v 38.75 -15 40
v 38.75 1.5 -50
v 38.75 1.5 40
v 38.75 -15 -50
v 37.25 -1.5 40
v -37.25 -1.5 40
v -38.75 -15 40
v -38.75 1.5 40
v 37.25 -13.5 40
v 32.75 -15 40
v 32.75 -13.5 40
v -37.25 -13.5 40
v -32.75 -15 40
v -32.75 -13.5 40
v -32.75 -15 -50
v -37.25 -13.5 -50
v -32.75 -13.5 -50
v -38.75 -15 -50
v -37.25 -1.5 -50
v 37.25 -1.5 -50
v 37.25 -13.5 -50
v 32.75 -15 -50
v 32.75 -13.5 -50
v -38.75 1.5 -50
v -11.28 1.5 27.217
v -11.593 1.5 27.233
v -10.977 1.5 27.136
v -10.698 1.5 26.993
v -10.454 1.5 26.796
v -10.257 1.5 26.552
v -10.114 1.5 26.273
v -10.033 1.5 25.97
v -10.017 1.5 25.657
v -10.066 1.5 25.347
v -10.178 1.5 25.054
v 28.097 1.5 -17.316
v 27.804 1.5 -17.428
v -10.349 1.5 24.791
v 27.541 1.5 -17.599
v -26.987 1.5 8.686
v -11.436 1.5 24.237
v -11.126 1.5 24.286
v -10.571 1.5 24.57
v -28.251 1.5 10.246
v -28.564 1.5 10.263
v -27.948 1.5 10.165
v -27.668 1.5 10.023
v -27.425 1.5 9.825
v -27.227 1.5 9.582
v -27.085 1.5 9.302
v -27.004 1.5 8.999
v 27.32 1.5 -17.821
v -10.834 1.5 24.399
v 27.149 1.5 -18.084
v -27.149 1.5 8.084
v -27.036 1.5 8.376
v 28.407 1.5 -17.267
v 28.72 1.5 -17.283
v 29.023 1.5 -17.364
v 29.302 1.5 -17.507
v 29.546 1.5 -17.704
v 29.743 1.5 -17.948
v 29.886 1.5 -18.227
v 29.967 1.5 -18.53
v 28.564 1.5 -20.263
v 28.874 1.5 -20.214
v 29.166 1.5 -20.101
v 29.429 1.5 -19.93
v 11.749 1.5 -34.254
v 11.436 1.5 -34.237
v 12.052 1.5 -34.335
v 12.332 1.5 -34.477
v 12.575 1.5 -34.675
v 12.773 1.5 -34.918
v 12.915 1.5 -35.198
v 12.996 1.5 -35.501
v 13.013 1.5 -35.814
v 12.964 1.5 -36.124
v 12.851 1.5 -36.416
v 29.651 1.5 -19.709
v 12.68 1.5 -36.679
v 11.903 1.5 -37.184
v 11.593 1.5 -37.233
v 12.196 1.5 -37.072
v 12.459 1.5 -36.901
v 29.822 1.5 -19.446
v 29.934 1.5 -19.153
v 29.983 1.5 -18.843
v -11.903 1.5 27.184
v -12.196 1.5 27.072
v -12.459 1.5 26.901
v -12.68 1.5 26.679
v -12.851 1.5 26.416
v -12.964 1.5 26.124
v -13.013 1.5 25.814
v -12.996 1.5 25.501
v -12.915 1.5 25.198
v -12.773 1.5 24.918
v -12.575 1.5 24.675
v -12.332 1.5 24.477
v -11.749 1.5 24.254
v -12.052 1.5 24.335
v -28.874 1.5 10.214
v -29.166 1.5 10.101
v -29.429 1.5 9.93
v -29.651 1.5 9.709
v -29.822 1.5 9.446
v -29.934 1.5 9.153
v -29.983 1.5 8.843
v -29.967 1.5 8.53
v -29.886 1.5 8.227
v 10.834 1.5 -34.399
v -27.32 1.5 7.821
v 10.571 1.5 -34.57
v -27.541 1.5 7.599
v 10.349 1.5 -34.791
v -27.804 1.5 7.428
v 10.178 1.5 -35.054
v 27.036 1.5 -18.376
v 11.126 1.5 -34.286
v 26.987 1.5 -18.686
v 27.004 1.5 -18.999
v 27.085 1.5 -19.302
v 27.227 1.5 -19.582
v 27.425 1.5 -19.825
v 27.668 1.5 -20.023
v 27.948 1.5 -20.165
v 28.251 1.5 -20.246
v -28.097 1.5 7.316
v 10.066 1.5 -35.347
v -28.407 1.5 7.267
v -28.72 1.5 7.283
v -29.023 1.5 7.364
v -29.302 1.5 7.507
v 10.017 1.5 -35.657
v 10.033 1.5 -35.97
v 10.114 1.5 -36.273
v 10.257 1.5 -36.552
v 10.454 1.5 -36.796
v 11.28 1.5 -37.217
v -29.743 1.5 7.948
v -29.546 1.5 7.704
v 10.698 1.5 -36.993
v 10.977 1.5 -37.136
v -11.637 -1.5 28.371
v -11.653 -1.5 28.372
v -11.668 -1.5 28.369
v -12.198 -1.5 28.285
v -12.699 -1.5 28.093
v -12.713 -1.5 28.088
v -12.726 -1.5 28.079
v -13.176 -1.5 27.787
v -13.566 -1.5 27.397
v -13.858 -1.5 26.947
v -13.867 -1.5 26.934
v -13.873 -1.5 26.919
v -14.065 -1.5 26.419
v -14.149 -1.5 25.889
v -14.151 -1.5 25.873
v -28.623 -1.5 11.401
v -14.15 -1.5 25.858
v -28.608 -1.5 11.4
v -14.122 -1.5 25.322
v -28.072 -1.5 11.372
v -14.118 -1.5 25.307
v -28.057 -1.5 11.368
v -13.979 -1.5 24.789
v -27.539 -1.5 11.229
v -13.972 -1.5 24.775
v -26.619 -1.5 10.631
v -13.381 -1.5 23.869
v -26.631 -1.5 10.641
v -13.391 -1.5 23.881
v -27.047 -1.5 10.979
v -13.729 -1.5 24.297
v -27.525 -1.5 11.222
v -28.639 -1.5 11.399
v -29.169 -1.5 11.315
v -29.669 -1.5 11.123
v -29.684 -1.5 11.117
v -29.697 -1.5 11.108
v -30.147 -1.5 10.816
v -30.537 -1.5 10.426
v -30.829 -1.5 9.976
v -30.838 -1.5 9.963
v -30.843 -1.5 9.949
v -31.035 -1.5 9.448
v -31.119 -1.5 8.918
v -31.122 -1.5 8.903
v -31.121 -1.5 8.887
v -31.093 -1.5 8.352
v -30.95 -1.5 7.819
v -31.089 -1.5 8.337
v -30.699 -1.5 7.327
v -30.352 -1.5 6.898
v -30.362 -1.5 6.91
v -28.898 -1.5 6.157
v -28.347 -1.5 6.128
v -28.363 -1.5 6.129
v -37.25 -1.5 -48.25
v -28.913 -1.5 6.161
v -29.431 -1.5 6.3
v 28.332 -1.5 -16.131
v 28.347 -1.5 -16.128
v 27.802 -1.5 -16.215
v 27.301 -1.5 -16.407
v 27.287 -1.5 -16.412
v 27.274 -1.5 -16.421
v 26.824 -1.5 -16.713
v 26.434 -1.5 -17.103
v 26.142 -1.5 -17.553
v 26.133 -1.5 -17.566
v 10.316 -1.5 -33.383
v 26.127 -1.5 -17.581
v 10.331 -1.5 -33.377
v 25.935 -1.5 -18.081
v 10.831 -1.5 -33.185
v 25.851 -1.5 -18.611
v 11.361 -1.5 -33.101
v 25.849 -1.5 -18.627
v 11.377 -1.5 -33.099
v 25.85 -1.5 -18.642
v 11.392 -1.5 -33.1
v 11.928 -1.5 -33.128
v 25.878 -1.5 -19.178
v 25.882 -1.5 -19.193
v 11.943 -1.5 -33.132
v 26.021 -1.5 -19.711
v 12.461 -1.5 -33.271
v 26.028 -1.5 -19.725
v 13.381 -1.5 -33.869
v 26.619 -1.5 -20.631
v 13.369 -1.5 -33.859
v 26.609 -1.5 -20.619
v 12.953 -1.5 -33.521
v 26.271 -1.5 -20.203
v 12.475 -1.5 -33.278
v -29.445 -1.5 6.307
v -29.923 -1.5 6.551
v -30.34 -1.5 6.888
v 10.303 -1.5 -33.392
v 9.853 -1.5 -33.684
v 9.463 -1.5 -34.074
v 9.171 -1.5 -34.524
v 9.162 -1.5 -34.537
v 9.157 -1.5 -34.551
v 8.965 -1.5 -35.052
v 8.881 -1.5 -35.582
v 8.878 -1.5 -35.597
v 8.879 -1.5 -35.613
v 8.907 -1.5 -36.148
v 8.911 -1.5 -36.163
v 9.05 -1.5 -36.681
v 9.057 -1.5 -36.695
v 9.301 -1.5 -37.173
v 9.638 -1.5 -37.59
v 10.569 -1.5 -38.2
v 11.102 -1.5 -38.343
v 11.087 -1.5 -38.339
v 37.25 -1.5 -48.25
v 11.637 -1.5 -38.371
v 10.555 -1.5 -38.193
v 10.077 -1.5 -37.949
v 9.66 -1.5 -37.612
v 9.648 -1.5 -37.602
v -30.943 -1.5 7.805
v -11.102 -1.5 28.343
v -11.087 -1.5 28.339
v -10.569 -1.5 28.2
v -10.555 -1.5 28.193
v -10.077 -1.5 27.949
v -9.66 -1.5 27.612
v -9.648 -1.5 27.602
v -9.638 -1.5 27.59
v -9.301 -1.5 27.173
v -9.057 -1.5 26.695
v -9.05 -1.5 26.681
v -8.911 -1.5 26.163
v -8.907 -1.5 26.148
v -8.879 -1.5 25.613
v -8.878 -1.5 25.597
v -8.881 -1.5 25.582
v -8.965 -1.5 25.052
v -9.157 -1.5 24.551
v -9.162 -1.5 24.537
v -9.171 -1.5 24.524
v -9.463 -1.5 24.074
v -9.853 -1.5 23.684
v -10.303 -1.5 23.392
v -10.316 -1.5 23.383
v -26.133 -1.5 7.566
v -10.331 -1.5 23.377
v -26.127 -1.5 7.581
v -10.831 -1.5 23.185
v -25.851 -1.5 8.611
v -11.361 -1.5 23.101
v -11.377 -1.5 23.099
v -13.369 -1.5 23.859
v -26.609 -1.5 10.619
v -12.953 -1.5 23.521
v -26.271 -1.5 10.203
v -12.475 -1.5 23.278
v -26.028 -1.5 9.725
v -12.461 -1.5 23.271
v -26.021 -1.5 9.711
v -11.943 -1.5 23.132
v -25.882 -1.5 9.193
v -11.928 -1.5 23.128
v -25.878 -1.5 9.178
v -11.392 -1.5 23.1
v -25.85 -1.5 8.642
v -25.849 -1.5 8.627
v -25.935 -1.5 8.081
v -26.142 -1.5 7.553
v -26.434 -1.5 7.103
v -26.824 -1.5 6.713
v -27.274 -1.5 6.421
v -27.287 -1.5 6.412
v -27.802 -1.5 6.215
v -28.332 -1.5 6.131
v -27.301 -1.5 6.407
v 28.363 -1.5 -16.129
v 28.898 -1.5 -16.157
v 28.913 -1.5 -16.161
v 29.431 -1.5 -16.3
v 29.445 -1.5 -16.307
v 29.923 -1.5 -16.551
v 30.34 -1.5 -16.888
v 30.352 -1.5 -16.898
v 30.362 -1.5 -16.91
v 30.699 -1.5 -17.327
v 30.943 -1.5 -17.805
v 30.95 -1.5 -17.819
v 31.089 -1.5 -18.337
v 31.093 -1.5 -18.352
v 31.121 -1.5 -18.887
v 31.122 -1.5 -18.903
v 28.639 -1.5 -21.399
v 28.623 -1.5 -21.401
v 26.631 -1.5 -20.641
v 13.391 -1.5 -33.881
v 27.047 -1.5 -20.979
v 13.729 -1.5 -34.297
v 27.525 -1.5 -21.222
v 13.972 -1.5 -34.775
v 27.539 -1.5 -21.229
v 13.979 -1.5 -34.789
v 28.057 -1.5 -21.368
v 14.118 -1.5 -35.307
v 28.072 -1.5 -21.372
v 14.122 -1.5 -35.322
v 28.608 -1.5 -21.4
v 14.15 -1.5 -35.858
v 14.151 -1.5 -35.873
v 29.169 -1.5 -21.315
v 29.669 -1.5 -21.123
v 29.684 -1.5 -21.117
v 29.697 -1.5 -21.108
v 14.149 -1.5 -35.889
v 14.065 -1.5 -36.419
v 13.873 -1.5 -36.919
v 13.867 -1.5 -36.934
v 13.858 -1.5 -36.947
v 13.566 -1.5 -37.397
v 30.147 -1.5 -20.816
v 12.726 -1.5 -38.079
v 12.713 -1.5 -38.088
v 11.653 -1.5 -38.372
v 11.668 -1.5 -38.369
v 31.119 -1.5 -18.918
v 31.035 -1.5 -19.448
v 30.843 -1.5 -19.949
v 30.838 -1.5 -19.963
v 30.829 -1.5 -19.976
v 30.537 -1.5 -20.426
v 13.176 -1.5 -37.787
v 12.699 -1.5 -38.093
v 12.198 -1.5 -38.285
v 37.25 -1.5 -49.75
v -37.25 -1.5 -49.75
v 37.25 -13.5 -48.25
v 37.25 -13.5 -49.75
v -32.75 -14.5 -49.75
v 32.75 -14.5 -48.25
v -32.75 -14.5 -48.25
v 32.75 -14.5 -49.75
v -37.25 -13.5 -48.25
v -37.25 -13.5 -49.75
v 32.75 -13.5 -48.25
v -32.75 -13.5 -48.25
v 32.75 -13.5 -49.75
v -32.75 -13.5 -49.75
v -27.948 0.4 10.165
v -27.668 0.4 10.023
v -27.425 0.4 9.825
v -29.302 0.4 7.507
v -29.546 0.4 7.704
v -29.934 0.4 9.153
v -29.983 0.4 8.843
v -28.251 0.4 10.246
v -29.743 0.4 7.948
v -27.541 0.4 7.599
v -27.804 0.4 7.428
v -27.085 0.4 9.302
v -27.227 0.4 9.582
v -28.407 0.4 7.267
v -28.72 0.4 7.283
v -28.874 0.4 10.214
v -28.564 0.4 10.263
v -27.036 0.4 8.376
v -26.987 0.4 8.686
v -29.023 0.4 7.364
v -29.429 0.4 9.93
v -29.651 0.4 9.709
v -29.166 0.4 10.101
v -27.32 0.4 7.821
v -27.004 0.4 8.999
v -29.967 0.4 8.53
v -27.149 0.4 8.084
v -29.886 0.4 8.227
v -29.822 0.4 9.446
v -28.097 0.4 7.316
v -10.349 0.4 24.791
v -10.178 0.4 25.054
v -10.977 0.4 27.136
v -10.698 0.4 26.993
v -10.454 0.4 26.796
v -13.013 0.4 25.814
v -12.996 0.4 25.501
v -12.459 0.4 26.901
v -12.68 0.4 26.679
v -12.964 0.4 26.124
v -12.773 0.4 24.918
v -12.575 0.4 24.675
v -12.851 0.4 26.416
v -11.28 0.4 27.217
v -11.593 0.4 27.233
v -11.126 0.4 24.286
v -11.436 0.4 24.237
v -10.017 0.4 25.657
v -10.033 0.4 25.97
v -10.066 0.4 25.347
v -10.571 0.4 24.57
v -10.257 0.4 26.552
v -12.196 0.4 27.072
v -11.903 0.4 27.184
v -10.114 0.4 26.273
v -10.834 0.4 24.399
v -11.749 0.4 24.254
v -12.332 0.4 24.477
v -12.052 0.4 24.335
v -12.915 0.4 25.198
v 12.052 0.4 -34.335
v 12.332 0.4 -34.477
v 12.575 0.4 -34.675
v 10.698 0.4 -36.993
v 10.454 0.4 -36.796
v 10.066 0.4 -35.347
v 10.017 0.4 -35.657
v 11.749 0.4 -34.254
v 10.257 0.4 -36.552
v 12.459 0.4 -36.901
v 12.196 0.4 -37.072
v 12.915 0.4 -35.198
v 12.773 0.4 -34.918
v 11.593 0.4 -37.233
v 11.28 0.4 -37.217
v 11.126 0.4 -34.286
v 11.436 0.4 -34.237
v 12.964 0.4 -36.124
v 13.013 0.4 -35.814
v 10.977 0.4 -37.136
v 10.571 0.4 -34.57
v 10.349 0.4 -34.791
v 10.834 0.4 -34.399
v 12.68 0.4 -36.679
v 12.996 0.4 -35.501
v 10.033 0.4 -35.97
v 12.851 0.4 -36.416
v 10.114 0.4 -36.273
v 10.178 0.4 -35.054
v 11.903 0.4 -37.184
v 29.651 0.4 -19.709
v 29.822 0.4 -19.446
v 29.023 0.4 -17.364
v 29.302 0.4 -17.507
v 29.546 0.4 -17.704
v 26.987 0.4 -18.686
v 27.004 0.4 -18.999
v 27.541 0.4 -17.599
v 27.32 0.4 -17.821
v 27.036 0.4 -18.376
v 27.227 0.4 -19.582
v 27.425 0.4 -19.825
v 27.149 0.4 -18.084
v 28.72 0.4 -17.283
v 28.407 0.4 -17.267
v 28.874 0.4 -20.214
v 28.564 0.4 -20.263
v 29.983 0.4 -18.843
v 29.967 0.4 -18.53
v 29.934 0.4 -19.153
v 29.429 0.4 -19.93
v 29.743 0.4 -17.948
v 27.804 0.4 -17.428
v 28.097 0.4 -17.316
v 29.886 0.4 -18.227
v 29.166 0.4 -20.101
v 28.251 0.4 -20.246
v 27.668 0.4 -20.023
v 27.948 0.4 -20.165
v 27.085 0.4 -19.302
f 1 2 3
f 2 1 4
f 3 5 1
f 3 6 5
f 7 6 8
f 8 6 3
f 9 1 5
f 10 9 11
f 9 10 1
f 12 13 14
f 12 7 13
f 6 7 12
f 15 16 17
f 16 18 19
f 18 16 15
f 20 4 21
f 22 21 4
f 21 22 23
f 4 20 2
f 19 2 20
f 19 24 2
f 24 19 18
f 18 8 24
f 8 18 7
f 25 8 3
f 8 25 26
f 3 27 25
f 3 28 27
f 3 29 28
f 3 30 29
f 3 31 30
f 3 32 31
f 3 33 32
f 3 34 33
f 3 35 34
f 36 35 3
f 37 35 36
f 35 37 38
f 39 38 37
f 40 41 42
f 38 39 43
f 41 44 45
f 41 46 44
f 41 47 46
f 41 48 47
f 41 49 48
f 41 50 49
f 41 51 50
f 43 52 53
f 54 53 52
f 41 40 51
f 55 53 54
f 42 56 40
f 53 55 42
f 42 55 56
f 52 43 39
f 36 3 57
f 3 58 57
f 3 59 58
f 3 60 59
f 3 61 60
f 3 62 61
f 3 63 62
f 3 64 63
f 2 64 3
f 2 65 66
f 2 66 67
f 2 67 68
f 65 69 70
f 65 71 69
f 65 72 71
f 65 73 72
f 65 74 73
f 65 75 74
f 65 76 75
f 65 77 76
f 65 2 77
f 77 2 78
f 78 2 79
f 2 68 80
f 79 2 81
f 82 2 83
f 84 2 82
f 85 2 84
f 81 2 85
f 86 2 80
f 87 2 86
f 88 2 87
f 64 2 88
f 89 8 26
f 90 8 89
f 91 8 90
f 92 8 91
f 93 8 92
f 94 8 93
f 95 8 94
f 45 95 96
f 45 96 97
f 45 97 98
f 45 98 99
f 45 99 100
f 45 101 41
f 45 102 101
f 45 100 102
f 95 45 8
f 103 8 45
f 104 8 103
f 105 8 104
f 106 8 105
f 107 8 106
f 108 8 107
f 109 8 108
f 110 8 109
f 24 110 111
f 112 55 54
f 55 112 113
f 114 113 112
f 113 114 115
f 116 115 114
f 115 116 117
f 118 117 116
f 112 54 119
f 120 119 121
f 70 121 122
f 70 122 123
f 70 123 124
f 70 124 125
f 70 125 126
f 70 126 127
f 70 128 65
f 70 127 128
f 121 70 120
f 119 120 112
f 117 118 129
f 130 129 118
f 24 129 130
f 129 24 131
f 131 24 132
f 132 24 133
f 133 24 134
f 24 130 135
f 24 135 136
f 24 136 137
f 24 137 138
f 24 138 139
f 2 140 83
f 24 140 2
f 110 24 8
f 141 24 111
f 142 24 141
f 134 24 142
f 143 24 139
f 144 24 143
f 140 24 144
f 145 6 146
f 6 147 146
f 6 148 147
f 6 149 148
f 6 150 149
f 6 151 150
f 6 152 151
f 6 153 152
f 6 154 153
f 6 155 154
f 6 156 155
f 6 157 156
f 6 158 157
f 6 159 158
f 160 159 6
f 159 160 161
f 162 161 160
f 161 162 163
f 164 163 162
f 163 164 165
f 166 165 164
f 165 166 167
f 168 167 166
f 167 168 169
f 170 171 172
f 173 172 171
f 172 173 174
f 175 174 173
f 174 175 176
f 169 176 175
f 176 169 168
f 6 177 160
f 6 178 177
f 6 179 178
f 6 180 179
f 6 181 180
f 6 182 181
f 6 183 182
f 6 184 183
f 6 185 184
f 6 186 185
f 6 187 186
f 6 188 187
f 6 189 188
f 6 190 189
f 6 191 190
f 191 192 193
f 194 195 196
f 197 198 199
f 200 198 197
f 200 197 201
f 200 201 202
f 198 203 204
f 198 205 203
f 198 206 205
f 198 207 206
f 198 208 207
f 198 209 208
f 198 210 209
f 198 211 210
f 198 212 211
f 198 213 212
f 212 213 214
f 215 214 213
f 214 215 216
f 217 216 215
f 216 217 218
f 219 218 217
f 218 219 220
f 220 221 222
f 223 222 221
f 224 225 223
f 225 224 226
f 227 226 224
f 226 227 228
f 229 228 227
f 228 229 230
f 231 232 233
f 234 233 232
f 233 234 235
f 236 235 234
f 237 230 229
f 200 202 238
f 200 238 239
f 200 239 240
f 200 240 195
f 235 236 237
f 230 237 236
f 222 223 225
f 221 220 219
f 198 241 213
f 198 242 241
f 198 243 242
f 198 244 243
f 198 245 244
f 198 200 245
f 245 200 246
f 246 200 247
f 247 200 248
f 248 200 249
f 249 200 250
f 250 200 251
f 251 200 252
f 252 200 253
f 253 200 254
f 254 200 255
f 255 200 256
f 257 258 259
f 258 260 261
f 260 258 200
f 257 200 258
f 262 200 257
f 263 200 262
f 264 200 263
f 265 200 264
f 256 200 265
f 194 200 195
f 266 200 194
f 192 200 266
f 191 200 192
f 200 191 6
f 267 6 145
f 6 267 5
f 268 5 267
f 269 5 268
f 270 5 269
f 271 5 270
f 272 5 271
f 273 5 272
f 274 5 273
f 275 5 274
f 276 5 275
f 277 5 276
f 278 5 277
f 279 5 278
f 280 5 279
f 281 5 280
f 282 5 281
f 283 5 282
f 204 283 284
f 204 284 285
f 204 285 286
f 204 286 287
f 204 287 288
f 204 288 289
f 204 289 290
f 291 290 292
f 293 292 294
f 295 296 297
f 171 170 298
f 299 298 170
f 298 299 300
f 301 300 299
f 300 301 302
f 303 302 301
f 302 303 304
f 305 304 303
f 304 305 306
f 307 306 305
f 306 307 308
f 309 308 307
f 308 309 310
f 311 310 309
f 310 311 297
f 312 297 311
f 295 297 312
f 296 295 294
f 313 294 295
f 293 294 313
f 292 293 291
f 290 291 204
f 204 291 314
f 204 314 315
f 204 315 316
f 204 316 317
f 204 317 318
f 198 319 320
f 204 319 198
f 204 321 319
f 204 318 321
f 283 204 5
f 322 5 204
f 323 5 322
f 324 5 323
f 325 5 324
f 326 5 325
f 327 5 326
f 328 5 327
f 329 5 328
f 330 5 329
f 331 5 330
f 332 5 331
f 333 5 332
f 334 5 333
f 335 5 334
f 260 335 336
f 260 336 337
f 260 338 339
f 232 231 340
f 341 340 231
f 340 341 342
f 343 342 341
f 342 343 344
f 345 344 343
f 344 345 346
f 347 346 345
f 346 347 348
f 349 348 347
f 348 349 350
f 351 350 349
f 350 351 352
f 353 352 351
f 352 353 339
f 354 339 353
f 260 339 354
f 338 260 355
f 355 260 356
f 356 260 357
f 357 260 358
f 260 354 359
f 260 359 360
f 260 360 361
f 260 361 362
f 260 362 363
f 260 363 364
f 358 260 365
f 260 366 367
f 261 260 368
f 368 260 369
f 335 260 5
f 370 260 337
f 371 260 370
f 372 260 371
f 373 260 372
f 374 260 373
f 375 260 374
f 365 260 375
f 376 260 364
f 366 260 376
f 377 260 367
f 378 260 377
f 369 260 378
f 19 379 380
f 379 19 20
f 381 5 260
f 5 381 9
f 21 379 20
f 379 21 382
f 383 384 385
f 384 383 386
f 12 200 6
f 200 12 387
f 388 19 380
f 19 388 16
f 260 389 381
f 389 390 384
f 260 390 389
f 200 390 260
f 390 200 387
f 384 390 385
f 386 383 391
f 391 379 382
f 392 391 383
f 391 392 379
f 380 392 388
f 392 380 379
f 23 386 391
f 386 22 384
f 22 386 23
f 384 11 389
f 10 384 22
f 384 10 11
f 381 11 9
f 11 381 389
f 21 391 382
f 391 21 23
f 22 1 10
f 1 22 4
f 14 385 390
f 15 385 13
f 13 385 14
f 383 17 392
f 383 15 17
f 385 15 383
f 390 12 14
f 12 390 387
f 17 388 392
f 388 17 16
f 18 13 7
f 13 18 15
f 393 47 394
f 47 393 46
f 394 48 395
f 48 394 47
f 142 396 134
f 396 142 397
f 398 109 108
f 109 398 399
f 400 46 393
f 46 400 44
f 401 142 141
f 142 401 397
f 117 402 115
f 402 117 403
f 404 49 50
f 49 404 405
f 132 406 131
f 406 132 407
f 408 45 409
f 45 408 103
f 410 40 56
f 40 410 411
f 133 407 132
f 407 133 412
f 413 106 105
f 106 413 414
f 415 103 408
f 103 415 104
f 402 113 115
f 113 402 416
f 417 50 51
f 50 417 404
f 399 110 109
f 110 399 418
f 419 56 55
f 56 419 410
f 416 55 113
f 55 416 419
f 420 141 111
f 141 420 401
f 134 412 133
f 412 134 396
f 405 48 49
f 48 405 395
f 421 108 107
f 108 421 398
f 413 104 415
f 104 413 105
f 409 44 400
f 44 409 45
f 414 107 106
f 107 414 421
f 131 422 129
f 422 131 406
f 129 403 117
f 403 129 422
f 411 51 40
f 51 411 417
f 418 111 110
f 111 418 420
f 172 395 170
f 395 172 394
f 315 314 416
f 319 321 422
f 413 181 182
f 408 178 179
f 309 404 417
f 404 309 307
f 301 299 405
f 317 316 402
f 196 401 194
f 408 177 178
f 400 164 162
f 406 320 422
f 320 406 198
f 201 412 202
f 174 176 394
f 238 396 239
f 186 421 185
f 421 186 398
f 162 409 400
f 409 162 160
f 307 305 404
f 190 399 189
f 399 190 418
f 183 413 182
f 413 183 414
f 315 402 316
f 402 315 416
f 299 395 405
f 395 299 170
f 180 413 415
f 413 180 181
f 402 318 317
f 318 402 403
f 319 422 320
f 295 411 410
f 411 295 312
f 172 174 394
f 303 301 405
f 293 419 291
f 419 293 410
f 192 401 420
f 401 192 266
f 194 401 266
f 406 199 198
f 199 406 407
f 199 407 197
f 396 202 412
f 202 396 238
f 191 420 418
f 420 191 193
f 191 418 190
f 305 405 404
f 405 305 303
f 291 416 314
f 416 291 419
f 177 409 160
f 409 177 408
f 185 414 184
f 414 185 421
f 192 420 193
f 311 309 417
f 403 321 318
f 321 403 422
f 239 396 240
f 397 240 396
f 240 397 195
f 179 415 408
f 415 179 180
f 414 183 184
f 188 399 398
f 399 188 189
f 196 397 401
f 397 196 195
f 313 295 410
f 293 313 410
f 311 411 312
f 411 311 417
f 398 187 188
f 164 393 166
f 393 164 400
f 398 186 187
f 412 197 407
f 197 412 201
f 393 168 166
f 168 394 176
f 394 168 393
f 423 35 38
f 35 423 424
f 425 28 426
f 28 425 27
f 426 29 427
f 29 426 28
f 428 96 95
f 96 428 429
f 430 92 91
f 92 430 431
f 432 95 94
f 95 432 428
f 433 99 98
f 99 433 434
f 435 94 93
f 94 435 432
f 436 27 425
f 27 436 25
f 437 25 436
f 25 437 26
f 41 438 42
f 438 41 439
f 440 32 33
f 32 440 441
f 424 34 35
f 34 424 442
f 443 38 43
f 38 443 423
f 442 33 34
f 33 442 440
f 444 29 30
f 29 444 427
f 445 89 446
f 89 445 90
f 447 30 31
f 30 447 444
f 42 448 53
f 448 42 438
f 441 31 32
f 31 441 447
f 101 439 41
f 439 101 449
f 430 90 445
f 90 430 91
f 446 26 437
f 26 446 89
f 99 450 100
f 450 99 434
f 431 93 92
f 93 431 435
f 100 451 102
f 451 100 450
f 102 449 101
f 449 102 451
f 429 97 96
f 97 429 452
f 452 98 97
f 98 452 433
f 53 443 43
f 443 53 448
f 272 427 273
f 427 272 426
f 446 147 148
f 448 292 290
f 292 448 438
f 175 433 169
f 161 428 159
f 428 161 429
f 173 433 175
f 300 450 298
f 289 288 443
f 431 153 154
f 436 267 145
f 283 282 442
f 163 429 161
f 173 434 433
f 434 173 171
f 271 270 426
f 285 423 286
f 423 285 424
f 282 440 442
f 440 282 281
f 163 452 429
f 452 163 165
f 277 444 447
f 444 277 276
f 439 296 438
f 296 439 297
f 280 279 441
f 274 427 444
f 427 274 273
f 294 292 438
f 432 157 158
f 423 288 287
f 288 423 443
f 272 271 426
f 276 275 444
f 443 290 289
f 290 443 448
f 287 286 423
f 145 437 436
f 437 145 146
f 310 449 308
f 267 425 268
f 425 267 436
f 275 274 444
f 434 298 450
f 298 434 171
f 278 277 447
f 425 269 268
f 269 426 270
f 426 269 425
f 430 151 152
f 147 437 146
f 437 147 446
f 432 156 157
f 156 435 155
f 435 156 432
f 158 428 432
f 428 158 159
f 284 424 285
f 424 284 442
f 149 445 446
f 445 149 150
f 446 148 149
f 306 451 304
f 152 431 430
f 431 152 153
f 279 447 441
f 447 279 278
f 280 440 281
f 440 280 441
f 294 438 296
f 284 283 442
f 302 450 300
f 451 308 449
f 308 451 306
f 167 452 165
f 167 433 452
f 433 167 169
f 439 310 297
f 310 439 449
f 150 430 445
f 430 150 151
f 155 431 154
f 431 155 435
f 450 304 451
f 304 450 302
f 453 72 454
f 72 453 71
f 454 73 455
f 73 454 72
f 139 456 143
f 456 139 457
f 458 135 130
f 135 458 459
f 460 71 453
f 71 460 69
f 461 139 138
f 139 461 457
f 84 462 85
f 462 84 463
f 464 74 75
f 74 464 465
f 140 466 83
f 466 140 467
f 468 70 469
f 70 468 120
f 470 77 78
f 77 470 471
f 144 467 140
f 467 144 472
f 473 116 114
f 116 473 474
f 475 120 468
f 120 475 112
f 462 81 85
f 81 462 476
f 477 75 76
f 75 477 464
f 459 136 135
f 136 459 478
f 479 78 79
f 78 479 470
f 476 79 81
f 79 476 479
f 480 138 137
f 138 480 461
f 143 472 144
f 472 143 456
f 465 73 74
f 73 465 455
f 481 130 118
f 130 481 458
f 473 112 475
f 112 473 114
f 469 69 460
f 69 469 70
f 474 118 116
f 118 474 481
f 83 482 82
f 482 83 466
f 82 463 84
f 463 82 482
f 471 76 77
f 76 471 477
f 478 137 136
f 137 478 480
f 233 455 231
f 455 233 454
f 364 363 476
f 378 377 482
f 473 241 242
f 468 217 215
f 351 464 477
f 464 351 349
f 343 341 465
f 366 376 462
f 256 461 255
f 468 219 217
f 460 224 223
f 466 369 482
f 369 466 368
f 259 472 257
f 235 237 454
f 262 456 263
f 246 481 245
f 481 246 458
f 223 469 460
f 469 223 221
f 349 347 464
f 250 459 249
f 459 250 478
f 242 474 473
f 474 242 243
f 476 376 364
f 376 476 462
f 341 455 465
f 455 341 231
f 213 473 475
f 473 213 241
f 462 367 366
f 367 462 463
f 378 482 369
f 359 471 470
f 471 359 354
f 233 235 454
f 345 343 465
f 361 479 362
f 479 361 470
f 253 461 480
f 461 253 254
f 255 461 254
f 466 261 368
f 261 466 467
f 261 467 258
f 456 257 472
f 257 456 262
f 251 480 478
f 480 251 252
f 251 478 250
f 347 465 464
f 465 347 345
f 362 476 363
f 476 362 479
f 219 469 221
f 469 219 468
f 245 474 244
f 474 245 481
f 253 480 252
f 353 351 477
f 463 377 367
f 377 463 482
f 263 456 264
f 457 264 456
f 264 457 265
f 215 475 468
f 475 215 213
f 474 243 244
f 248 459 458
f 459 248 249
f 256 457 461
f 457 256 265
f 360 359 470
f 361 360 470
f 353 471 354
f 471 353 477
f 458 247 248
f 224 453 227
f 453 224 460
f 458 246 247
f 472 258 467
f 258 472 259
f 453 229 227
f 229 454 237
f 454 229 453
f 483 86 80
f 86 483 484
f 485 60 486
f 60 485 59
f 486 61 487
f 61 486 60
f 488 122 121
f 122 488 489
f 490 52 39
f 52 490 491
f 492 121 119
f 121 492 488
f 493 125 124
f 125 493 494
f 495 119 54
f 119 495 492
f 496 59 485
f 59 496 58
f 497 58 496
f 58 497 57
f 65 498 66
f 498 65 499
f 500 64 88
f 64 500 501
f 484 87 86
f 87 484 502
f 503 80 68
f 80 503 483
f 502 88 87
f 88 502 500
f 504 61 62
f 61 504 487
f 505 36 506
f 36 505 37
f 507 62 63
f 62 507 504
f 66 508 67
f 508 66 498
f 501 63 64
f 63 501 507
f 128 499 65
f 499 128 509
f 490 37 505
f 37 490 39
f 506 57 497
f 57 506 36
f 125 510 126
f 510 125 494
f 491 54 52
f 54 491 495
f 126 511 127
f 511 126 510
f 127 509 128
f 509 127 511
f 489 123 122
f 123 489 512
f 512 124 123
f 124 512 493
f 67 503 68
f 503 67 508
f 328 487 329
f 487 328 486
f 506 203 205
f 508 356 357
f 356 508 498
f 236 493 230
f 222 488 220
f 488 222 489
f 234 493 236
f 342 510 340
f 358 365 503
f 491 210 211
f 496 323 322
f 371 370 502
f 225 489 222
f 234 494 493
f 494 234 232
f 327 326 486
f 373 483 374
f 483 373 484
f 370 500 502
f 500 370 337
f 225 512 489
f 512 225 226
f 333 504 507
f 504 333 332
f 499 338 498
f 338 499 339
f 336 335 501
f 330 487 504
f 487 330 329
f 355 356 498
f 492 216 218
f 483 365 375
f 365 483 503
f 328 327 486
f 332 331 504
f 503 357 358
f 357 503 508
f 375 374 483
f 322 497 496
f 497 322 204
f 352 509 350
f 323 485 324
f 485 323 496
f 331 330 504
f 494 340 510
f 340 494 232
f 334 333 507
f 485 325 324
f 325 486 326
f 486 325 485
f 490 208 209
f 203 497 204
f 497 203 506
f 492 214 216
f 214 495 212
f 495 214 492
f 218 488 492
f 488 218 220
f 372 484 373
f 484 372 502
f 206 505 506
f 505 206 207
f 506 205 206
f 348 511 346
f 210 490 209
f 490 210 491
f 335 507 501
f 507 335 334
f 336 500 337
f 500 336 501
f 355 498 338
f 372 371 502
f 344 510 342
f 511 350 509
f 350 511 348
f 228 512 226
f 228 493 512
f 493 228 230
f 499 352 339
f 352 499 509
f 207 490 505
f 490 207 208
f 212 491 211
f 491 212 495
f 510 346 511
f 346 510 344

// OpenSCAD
// smartphone adapter for "Push To Telescope"
$fn=30;
thickness=1.5; 
iphoneWidth=74.5;
iphoneThickness=13;
retainerWidth=6;
baseHeight=90;


   
module drillHoles() {
                translate([-12,3,0]) rotate([90,0,0]) cylinder(h=12,d=3,center=true);
         translate([-12,-0.6,0]) rotate([90,0,0]) cylinder(h=2,d2=5.4,d1=3,center=true); //countersink
    
                   translate([12,3,0]) rotate([90,0,0]) cylinder(h=12,d=3,center=true);
           translate([12,-0.6,0]) rotate([90,0,0]) cylinder(h=2,d2=5.4,d1=3,center=true);//countersink
}

module holders() {
    difference() {
        union() {
        color("blue") translate([0,20,0])   cube([70,30,10],center=true);
        }
        union() {
       translate([0,16,0])  cube([35,3,100],center=true); //belt slot
            translate([0,65,30]) rotate([0,90,0]) cylinder(h=120,d=100,center=true);
            translate([0,7,0]) drillHoles();
        }
    }
}
    *holders();

module base(){
    difference() {
        union() {
    translate([0,0,-5]) cube([iphoneWidth+thickness*2,3,90],center=true);
    //sides
    color("red") translate([iphoneWidth/2+thickness/2,-3-5,-5])   cube([thickness,iphoneThickness,90],center=true);
        color("red") translate([-iphoneWidth/2-thickness/2,-3-5,-5])   cube([thickness,iphoneThickness,90],center=true);
       color("red") translate([0,-8,-49])  cube([iphoneWidth,iphoneThickness,thickness],center=true);
    //tops
    translate([+iphoneWidth/2+thickness-retainerWidth,-3-5-1.0-12/2,-50]) cube([retainerWidth,1.5,90]);
    translate([-iphoneWidth/2-thickness,-3-5-1.0-12/2,-50]) cube([retainerWidth,1.5,90]);
    *translate([0,1,-5]) rotate([0,135,0]) holders();
        }
        union() {
 translate([-baseHeight/2+25,0,iphoneWidth/2-20]) rotate([0,-45,0]) drillHoles();
            translate([baseHeight/2-25,0,-iphoneWidth/2+10]) rotate([0,-45,0]) drillHoles();
        }
    }
}


module iPhone() {
    cube([75,12,140],center=true);
    }
    
//rotate([0,45,0])  
    base();
    *color("black")  rotate([0,45,0]) translate([0,-8,28])iPhone();
